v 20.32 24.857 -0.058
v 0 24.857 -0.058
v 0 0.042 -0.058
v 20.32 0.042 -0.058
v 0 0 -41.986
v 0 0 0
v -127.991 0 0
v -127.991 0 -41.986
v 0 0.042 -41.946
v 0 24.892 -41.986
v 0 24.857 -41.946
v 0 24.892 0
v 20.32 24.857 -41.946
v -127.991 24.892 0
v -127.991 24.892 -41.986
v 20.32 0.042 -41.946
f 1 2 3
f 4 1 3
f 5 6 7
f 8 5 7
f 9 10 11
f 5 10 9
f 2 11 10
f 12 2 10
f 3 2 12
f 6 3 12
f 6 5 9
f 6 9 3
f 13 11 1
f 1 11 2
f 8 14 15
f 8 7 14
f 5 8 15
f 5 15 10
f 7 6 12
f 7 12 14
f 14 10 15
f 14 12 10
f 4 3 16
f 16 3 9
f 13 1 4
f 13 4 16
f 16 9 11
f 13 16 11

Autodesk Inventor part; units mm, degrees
ref_plane "YZ Plane" through (0, 0, 0) normal (1, 0, 0) x (0, 1, 0)
ref_plane "XZ Plane" through (0, 0, 0) normal (0, 1, 0) x (-1, 0, 0)
ref_plane "XY Plane" through (0, 0, 0) normal (0, 0, 1) x (1, 0, 0)
sketch "Sketch1" plane through (0, 0, 0) normal (0, 1, 0) x (-1, 0, 0)
  line L0 (0, 0) -> (127.9906, 0)
  line L1 (127.9906, 0) -> (127.9906, -41.9862)
  line L2 (127.9906, -41.9862) -> (0, -41.9862)
  line L3 (0, -41.9862) -> (0, 0)
  dimension "d0" = 127.9906
  dimension "d1" = 41.9862
extrude "Extrusion1" add sketch "Sketch1" along normal blind 24.892
sketch "Sketch2" plane through (0, 0, 0) normal (1, 0, 0) x (0, 0, -1)
  line L0 (0.0584, 0.0419) -> (41.946, 0.0419)
  line L1 (41.946, 0.0419) -> (41.946, 24.8567)
  line L2 (41.946, 24.8567) -> (0.0584, 24.8567)
  line L3 (0.0584, 24.8567) -> (0.0584, 0.0419)
  point P0 (0, 0)
  point P1 (41.9862, 24.892)
extrude "Extrusion2" add sketch "Sketch2" along normal blind 20.32
properties part number "battery"
